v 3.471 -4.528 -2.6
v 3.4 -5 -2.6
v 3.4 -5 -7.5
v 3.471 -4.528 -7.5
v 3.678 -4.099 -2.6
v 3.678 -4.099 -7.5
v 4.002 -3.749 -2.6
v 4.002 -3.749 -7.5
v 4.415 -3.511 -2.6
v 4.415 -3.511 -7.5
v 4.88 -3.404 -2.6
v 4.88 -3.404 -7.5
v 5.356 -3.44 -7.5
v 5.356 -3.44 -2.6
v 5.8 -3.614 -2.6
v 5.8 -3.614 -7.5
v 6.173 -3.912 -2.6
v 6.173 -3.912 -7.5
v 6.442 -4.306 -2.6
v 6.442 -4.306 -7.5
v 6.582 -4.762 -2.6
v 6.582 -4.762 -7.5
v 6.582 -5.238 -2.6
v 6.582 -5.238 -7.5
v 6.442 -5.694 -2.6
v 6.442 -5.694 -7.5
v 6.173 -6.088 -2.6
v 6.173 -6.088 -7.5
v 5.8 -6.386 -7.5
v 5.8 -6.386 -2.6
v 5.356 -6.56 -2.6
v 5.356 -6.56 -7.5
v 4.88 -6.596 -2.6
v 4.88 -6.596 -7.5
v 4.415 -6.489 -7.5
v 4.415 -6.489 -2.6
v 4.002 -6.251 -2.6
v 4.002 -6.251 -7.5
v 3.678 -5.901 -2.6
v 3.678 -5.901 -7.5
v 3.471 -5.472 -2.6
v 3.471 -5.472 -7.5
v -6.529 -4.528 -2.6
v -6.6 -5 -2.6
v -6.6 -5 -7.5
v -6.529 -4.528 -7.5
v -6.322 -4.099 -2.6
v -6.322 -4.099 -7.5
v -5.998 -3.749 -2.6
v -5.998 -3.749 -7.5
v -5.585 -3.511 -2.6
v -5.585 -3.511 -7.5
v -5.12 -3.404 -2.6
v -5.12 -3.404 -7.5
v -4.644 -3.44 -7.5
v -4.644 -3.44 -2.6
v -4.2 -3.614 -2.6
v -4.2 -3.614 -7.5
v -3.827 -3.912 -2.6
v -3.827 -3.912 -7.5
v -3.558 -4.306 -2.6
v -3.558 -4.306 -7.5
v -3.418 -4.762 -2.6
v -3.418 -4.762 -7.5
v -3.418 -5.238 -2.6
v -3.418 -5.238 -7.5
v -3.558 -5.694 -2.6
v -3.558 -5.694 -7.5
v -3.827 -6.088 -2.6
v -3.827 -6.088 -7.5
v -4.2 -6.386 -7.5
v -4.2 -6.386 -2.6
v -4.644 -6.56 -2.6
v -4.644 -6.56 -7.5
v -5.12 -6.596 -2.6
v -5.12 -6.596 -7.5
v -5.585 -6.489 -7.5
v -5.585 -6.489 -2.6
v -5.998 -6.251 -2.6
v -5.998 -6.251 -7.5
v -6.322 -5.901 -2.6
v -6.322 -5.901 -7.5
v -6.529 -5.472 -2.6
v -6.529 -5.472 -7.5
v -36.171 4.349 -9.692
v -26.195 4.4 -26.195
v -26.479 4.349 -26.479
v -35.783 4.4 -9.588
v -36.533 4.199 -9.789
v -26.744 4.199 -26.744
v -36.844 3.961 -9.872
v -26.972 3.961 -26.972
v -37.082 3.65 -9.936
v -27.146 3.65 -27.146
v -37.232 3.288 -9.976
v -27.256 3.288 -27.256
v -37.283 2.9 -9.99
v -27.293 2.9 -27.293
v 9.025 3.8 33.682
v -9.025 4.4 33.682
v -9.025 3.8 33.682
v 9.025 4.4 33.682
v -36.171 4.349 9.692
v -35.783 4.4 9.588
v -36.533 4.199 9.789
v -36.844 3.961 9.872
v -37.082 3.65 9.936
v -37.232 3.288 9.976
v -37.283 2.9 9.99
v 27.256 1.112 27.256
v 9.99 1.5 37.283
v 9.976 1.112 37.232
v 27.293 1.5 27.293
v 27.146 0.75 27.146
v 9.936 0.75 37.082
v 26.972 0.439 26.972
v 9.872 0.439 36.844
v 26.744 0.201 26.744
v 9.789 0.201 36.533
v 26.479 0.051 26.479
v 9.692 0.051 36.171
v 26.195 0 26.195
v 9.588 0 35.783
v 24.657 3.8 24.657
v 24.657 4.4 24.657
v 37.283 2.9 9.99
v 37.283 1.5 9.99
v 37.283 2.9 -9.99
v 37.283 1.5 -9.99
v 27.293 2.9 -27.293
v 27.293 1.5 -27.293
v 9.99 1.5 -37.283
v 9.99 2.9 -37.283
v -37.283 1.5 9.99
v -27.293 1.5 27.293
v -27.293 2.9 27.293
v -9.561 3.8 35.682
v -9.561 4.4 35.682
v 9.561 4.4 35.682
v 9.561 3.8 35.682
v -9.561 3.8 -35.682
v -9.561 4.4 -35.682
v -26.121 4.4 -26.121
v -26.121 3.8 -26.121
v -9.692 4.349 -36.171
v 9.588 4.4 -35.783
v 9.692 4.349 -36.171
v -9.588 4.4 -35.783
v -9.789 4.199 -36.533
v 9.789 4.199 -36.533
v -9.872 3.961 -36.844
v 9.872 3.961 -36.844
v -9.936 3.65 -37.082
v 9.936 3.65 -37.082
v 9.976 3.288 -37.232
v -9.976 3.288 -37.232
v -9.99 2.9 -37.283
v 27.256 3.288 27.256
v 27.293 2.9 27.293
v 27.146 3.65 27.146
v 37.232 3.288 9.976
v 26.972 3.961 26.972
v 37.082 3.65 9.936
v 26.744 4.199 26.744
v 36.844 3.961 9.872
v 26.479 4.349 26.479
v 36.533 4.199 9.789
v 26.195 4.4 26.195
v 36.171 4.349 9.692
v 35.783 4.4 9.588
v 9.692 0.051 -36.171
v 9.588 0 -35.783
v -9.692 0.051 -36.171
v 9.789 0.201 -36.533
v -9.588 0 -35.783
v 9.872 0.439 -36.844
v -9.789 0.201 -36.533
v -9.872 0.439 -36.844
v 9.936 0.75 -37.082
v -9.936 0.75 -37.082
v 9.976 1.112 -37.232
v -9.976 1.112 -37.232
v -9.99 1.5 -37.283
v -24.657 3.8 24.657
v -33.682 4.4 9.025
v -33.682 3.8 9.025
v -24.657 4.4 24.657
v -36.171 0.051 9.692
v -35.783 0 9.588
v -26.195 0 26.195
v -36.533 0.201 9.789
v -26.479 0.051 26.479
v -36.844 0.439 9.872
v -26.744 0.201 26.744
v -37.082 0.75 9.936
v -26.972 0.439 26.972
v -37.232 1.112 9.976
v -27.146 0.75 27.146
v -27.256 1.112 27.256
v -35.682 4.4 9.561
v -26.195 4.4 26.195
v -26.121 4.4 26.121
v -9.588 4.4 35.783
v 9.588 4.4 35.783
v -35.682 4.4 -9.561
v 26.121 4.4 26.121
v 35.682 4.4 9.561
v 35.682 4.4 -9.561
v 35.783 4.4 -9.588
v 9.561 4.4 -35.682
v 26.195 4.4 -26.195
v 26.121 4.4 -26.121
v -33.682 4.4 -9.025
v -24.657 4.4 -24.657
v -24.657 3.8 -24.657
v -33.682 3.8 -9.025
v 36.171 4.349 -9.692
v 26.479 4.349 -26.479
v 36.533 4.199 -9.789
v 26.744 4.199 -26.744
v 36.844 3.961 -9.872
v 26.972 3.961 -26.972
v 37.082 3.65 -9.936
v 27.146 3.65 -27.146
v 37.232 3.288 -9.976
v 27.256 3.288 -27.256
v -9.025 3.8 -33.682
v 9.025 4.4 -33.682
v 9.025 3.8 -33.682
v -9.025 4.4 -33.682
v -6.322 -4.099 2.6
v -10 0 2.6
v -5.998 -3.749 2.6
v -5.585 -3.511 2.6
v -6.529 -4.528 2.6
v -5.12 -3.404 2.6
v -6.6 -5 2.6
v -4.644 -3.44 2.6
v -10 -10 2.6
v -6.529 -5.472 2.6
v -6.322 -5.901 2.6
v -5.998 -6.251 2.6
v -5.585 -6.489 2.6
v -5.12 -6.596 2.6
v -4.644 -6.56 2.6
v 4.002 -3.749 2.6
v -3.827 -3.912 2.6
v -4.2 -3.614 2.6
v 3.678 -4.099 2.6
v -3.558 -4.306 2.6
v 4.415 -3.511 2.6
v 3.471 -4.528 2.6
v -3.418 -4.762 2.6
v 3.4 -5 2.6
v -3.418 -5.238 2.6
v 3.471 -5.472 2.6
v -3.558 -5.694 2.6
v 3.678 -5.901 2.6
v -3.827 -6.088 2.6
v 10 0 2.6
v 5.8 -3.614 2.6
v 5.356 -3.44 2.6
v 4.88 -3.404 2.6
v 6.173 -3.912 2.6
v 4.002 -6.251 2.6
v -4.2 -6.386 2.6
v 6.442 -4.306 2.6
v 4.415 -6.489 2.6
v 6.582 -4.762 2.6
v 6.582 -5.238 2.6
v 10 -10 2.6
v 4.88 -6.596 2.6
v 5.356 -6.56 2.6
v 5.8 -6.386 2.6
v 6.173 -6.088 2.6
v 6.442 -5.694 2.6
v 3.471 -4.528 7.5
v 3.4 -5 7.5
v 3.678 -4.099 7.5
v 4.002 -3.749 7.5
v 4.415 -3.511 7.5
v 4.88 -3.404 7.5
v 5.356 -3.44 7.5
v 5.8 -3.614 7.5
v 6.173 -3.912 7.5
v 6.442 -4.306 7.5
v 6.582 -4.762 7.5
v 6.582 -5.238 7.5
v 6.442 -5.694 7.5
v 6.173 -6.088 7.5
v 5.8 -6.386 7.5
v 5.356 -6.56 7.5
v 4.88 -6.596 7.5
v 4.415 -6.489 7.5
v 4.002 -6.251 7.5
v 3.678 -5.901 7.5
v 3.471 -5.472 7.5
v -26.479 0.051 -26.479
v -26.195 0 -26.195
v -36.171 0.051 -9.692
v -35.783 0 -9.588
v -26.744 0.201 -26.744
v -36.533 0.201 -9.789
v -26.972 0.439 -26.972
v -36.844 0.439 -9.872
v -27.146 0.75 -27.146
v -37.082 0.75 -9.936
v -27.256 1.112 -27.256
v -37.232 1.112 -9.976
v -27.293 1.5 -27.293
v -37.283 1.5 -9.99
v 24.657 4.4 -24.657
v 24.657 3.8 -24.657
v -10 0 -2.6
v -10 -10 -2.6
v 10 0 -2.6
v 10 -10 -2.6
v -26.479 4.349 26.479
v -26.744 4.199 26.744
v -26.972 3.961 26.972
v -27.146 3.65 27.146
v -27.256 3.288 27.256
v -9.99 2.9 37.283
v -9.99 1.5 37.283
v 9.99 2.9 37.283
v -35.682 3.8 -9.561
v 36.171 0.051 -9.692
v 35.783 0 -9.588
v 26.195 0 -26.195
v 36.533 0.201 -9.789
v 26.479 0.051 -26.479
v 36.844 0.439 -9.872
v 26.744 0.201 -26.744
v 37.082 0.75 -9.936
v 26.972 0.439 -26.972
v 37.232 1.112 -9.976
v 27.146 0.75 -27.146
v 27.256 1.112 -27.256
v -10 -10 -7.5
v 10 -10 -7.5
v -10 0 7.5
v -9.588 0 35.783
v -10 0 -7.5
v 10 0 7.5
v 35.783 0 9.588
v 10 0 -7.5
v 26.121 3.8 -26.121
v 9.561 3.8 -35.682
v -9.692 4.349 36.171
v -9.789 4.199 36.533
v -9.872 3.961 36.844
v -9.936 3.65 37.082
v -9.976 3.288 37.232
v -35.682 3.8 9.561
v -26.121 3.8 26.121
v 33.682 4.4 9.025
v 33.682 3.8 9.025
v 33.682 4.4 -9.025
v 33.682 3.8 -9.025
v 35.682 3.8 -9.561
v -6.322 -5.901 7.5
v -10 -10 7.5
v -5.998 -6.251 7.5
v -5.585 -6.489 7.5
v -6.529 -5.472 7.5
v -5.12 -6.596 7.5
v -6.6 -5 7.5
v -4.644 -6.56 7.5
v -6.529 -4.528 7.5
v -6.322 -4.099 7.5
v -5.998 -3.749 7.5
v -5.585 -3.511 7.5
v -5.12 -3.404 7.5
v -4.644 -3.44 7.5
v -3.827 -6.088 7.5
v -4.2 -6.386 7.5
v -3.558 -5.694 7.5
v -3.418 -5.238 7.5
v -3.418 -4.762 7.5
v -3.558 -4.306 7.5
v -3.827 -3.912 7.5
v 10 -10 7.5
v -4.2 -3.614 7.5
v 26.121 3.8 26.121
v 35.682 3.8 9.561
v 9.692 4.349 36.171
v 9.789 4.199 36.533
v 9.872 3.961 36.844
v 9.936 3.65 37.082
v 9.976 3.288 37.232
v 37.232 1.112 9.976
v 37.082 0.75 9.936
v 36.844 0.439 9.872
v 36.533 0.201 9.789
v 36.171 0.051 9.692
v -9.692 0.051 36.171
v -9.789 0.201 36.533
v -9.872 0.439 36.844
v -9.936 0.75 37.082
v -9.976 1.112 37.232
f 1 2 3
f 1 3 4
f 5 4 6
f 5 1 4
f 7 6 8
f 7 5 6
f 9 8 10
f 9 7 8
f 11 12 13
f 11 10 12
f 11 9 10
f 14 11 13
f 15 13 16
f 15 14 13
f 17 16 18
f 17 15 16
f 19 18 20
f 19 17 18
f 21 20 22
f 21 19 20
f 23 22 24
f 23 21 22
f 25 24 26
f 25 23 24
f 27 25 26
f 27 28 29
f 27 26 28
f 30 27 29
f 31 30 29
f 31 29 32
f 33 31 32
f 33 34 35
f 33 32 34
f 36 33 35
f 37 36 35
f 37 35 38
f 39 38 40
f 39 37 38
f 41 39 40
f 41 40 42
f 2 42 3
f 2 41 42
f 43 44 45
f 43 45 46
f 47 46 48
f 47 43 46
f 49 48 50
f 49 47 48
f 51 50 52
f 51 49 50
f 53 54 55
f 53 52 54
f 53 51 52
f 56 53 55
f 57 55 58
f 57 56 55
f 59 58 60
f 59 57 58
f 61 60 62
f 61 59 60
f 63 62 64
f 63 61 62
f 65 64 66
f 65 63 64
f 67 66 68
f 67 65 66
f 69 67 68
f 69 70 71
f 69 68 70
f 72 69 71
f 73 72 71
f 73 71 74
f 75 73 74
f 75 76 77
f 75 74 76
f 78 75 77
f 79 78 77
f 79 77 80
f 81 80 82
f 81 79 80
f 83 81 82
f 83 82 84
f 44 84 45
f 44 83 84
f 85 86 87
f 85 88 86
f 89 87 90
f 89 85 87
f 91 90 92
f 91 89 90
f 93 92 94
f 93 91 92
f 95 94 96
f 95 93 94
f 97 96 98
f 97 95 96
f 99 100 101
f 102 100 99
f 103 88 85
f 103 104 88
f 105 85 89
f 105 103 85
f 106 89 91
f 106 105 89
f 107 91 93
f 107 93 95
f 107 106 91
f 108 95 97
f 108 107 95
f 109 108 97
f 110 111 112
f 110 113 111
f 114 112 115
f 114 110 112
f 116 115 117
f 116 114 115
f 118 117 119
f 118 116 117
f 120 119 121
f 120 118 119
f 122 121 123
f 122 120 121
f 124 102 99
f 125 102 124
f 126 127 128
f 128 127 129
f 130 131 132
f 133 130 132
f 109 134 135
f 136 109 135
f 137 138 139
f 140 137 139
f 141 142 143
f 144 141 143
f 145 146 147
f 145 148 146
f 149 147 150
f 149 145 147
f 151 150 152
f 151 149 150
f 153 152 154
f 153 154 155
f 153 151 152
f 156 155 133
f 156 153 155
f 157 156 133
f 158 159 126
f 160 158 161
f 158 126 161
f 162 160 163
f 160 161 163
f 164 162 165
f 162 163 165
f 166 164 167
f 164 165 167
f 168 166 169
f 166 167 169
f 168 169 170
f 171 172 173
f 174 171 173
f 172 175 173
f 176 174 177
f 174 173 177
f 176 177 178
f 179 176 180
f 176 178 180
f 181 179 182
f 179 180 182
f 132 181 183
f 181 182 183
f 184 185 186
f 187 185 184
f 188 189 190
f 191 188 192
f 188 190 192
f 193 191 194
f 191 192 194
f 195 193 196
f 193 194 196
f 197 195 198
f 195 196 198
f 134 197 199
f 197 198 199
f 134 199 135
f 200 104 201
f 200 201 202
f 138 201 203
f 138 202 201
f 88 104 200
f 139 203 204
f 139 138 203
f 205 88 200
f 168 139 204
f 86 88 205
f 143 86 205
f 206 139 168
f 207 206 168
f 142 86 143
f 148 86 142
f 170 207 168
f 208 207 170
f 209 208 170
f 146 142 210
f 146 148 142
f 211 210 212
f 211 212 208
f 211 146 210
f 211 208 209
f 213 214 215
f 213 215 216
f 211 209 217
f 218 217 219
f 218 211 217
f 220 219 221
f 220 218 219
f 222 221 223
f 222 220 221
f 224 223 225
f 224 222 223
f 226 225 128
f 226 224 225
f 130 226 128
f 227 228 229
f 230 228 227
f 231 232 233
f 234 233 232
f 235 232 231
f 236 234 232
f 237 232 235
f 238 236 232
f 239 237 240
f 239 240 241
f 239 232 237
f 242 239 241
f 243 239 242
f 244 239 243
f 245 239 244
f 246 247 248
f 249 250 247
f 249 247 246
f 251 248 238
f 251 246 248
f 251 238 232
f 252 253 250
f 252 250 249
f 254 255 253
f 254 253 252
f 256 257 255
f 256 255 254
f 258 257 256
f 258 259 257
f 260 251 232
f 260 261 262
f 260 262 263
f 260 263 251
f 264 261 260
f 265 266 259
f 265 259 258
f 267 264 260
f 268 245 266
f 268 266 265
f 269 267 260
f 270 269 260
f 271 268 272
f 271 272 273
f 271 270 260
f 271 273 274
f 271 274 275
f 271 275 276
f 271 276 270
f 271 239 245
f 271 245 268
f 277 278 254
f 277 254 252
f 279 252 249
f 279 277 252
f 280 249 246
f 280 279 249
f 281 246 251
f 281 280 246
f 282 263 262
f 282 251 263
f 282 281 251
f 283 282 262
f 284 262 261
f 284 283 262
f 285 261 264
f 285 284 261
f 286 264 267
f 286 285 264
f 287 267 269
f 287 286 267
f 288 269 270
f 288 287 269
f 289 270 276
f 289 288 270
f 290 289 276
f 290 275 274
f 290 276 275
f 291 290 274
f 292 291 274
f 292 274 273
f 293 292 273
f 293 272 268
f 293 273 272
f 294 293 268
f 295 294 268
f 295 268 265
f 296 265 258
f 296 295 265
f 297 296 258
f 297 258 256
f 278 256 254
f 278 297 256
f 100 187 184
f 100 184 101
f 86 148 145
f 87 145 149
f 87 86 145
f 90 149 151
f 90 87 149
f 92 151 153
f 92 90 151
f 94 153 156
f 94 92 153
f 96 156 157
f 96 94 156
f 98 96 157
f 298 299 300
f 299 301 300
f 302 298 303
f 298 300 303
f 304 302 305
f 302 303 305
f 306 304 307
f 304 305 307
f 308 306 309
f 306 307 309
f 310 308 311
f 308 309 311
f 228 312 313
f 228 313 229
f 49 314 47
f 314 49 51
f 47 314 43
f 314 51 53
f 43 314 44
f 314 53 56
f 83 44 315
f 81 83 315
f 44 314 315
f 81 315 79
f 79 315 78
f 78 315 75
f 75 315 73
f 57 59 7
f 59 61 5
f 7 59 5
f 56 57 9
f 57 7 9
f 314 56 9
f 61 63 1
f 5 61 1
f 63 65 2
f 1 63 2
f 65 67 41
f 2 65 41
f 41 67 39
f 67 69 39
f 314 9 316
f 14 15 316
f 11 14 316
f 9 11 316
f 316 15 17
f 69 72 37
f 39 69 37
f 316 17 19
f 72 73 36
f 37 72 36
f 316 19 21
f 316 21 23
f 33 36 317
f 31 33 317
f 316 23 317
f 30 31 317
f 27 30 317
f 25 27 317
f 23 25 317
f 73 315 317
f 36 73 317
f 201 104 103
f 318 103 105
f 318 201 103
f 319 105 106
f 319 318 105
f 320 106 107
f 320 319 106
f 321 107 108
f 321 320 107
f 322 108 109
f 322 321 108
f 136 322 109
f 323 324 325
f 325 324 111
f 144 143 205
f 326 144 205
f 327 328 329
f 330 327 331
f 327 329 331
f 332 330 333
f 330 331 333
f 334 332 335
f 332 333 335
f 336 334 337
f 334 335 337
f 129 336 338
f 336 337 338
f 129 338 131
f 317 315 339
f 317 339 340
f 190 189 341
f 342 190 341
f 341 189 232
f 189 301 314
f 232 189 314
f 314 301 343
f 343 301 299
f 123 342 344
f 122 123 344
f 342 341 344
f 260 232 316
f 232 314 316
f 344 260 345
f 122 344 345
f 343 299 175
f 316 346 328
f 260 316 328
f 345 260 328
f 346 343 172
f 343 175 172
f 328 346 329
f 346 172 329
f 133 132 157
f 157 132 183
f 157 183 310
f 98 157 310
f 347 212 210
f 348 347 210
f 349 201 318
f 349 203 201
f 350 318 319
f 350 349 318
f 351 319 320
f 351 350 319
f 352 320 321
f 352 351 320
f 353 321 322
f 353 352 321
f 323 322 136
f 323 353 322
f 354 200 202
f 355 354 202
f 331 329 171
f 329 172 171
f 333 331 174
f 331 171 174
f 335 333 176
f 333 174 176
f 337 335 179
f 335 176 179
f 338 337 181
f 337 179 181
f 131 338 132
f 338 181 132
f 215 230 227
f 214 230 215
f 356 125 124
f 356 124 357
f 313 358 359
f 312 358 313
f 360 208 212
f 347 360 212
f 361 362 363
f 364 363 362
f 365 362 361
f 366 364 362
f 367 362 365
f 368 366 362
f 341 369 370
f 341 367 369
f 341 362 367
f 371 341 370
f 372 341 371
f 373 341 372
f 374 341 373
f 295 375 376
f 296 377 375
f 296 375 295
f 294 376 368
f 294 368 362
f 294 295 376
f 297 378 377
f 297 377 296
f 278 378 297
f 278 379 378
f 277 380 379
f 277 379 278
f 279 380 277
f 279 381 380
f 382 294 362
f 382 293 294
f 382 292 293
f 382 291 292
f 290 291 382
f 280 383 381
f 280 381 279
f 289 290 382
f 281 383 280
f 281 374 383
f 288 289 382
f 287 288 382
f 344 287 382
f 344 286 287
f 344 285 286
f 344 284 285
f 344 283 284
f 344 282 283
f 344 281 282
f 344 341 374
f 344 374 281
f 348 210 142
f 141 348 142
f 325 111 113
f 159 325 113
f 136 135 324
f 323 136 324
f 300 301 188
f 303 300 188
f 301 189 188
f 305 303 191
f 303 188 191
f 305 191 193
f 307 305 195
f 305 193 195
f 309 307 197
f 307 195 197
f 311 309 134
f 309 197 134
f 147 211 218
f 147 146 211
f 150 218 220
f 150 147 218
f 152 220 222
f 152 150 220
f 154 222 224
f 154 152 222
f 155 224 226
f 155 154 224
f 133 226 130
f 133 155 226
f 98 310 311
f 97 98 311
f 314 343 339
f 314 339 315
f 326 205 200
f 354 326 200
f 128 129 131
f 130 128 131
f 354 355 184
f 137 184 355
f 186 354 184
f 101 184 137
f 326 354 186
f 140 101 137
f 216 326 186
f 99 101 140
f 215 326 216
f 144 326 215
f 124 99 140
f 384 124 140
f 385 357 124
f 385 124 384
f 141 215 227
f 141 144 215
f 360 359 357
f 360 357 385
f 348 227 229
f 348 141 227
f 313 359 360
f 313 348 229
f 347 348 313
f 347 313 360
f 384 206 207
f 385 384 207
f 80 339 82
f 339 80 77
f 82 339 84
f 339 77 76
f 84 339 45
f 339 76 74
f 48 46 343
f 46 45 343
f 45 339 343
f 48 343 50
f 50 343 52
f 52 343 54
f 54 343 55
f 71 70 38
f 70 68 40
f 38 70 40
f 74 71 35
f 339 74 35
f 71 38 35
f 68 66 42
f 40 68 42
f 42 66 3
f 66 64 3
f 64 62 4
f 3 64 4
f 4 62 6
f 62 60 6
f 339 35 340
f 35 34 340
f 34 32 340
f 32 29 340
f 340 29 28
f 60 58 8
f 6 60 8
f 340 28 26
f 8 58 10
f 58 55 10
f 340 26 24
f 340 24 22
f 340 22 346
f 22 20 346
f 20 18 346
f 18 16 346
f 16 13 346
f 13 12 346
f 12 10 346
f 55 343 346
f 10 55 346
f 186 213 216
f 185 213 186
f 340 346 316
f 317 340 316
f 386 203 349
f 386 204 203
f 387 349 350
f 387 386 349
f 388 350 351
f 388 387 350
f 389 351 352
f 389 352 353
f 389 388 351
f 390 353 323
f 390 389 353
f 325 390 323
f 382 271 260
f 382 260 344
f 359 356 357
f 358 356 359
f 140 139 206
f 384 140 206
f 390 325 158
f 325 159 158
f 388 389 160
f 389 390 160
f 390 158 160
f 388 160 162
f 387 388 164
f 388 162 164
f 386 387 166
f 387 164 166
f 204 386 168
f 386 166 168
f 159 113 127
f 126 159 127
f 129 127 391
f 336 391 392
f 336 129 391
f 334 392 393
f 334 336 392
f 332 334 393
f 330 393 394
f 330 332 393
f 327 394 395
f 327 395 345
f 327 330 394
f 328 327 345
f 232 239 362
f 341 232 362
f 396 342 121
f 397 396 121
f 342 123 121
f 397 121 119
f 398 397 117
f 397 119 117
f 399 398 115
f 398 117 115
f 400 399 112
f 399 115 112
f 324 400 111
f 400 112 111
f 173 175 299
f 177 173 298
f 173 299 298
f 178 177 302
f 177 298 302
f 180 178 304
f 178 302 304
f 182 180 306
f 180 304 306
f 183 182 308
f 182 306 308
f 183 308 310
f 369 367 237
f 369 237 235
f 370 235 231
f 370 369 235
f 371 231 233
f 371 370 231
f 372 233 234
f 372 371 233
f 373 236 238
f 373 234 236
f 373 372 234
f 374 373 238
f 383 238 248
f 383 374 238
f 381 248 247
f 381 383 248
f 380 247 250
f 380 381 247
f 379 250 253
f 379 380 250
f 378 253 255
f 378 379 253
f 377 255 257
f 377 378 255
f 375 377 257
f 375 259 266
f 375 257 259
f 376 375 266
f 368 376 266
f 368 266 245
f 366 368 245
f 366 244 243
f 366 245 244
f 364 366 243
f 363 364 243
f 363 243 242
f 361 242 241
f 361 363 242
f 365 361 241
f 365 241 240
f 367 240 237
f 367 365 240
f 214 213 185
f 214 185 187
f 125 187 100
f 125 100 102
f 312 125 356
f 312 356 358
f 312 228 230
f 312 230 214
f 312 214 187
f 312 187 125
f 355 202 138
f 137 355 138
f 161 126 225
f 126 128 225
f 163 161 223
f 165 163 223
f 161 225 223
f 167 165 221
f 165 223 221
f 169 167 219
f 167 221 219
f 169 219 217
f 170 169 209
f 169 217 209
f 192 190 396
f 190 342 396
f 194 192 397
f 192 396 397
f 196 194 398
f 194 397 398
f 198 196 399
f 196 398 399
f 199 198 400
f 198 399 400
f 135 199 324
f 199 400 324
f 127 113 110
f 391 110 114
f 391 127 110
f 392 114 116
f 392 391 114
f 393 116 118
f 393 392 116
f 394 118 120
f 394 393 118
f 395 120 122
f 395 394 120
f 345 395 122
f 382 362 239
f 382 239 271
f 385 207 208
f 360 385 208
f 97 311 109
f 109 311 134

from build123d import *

# Parameters (mm, degrees)
EXTRUDE_1_DEPTH          = 4.4
CUT_EXTRUDE_1_DEPTH      = 0.6
FILLET_1_R               = 1.5
SKETCH_3_W               = 20
SKETCH_3_H               = 15
EXTRUDE_2_DEPTH          = 10
SKETCH_4_W               = 20
SKETCH_4_H               = 5.2
CUT_EXTRUDE_2_DEPTH      = 10
CUT_EXTRUDE_3_DEPTH      = 60.123345338
CUT_EXTRUDE_3_DEPTH_BACK = 60.123345338
SKETCH_5_R               = 1.6


with BuildPart() as part:
    # 스케치1 → 보스-돌출1 (new body)
    with BuildSketch(Plane(origin=(0, 0, 0), x_dir=(1, 0, 0), z_dir=(0, 1, 0))):
        Polygon((27.293187568, -27.293187568), (37.283187568, -9.99), (37.283187568, 9.99), (27.293187568, 27.293187568), (9.99, 37.283187568), (-9.99, 37.283187568), (-27.293187568, 27.293187568), (-37.283187568, 9.99), (-37.283187568, -9.99), (-27.293187568, -27.293187568), (-9.99, -37.283187568), (9.99, -37.283187568), align=None)
    extrude(amount=EXTRUDE_1_DEPTH)

    # 스케치2 → 컷-돌출1 (cut)
    with BuildSketch(Plane(origin=(0, 4.4, 0), x_dir=(1, 0, 0), z_dir=(0, 1, 0))):
        Polygon((-26.120860153, 26.120860153), (-35.681758538, 9.560898385), (-35.681758538, -9.560898385), (-26.120860153, -26.120860153), (-9.560898385, -35.681758538), (9.560898385, -35.681758538), (26.120860153, -26.120860153), (35.681758538, -9.560898385), (35.681758538, 9.560898385), (26.120860153, 26.120860153), (9.560898385, 35.681758538), (-9.560898385, 35.681758538), align=None)
        Polygon((24.656758538, -24.656758538), (33.681758538, -9.025), (33.681758538, 9.025), (24.656758538, 24.656758538), (9.025, 33.681758538), (-9.025, 33.681758538), (-24.656758538, 24.656758538), (-33.681758538, 9.025), (-33.681758538, -9.025), (-24.656758538, -24.656758538), (-9.025, -33.681758538), (9.025, -33.681758538), align=None, mode=Mode.SUBTRACT)
    extrude(amount=-CUT_EXTRUDE_1_DEPTH, mode=Mode.SUBTRACT)

    # 필렛1
    fillet_1_edges = [part.edges().sort_by_distance(p)[0] for p in [
        (0, 0, 37.283187568),
        (-18.641593784, 0, 32.288187568),
        (37.283187568, 4.4, 0),
        (-32.288187568, 0, 18.641593784),
        (-37.283187568, 0, 0),
        (-32.288187568, 0, -18.641593784),
        (-18.641593784, 0, -32.288187568),
        (0, 0, -37.283187568),
        (18.641593784, 0, -32.288187568),
        (32.288187568, 0, -18.641593784),
        (37.283187568, 0, 0),
        (32.288187568, 0, 18.641593784),
        (18.641593784, 0, 32.288187568),
        (32.288187568, 4.4, -18.641593784),
        (18.641593784, 4.4, -32.288187568),
        (0, 4.4, -37.283187568),
        (-18.641593784, 4.4, -32.288187568),
        (-32.288187568, 4.4, -18.641593784),
        (-37.283187568, 4.4, 0),
        (-32.288187568, 4.4, 18.641593784),
        (-18.641593784, 4.4, 32.288187568),
        (0, 4.4, 37.283187568),
        (18.641593784, 4.4, 32.288187568),
        (32.288187568, 4.4, 18.641593784),
    ]]
    fillet(fillet_1_edges, radius=FILLET_1_R)

    # 스케치3 → 보스-돌출2 (add)
    with BuildSketch(Plane.XZ):
        Rectangle(SKETCH_3_W, SKETCH_3_H)
    extrude(amount=EXTRUDE_2_DEPTH)

    # 스케치4 → 컷-돌출2 (cut)
    with BuildSketch(Plane.XZ.offset(10)):
        Rectangle(SKETCH_4_W, SKETCH_4_H)
    extrude(amount=-CUT_EXTRUDE_2_DEPTH, mode=Mode.SUBTRACT)

    # 스케치5 → 컷-돌출3 (cut, two sides: drawn at the far end of the back side and taken through both)
    with BuildSketch(Plane(origin=(0, 0, -7.5), x_dir=(-1, 0, 0), z_dir=(0, 0, -1)).offset(-CUT_EXTRUDE_3_DEPTH_BACK)):
        with Locations((-5, -5)):
            Circle(SKETCH_5_R)
        with Locations((5, -5)):
            Circle(SKETCH_5_R)
    extrude(amount=CUT_EXTRUDE_3_DEPTH + CUT_EXTRUDE_3_DEPTH_BACK, mode=Mode.SUBTRACT)


solid = part.part
